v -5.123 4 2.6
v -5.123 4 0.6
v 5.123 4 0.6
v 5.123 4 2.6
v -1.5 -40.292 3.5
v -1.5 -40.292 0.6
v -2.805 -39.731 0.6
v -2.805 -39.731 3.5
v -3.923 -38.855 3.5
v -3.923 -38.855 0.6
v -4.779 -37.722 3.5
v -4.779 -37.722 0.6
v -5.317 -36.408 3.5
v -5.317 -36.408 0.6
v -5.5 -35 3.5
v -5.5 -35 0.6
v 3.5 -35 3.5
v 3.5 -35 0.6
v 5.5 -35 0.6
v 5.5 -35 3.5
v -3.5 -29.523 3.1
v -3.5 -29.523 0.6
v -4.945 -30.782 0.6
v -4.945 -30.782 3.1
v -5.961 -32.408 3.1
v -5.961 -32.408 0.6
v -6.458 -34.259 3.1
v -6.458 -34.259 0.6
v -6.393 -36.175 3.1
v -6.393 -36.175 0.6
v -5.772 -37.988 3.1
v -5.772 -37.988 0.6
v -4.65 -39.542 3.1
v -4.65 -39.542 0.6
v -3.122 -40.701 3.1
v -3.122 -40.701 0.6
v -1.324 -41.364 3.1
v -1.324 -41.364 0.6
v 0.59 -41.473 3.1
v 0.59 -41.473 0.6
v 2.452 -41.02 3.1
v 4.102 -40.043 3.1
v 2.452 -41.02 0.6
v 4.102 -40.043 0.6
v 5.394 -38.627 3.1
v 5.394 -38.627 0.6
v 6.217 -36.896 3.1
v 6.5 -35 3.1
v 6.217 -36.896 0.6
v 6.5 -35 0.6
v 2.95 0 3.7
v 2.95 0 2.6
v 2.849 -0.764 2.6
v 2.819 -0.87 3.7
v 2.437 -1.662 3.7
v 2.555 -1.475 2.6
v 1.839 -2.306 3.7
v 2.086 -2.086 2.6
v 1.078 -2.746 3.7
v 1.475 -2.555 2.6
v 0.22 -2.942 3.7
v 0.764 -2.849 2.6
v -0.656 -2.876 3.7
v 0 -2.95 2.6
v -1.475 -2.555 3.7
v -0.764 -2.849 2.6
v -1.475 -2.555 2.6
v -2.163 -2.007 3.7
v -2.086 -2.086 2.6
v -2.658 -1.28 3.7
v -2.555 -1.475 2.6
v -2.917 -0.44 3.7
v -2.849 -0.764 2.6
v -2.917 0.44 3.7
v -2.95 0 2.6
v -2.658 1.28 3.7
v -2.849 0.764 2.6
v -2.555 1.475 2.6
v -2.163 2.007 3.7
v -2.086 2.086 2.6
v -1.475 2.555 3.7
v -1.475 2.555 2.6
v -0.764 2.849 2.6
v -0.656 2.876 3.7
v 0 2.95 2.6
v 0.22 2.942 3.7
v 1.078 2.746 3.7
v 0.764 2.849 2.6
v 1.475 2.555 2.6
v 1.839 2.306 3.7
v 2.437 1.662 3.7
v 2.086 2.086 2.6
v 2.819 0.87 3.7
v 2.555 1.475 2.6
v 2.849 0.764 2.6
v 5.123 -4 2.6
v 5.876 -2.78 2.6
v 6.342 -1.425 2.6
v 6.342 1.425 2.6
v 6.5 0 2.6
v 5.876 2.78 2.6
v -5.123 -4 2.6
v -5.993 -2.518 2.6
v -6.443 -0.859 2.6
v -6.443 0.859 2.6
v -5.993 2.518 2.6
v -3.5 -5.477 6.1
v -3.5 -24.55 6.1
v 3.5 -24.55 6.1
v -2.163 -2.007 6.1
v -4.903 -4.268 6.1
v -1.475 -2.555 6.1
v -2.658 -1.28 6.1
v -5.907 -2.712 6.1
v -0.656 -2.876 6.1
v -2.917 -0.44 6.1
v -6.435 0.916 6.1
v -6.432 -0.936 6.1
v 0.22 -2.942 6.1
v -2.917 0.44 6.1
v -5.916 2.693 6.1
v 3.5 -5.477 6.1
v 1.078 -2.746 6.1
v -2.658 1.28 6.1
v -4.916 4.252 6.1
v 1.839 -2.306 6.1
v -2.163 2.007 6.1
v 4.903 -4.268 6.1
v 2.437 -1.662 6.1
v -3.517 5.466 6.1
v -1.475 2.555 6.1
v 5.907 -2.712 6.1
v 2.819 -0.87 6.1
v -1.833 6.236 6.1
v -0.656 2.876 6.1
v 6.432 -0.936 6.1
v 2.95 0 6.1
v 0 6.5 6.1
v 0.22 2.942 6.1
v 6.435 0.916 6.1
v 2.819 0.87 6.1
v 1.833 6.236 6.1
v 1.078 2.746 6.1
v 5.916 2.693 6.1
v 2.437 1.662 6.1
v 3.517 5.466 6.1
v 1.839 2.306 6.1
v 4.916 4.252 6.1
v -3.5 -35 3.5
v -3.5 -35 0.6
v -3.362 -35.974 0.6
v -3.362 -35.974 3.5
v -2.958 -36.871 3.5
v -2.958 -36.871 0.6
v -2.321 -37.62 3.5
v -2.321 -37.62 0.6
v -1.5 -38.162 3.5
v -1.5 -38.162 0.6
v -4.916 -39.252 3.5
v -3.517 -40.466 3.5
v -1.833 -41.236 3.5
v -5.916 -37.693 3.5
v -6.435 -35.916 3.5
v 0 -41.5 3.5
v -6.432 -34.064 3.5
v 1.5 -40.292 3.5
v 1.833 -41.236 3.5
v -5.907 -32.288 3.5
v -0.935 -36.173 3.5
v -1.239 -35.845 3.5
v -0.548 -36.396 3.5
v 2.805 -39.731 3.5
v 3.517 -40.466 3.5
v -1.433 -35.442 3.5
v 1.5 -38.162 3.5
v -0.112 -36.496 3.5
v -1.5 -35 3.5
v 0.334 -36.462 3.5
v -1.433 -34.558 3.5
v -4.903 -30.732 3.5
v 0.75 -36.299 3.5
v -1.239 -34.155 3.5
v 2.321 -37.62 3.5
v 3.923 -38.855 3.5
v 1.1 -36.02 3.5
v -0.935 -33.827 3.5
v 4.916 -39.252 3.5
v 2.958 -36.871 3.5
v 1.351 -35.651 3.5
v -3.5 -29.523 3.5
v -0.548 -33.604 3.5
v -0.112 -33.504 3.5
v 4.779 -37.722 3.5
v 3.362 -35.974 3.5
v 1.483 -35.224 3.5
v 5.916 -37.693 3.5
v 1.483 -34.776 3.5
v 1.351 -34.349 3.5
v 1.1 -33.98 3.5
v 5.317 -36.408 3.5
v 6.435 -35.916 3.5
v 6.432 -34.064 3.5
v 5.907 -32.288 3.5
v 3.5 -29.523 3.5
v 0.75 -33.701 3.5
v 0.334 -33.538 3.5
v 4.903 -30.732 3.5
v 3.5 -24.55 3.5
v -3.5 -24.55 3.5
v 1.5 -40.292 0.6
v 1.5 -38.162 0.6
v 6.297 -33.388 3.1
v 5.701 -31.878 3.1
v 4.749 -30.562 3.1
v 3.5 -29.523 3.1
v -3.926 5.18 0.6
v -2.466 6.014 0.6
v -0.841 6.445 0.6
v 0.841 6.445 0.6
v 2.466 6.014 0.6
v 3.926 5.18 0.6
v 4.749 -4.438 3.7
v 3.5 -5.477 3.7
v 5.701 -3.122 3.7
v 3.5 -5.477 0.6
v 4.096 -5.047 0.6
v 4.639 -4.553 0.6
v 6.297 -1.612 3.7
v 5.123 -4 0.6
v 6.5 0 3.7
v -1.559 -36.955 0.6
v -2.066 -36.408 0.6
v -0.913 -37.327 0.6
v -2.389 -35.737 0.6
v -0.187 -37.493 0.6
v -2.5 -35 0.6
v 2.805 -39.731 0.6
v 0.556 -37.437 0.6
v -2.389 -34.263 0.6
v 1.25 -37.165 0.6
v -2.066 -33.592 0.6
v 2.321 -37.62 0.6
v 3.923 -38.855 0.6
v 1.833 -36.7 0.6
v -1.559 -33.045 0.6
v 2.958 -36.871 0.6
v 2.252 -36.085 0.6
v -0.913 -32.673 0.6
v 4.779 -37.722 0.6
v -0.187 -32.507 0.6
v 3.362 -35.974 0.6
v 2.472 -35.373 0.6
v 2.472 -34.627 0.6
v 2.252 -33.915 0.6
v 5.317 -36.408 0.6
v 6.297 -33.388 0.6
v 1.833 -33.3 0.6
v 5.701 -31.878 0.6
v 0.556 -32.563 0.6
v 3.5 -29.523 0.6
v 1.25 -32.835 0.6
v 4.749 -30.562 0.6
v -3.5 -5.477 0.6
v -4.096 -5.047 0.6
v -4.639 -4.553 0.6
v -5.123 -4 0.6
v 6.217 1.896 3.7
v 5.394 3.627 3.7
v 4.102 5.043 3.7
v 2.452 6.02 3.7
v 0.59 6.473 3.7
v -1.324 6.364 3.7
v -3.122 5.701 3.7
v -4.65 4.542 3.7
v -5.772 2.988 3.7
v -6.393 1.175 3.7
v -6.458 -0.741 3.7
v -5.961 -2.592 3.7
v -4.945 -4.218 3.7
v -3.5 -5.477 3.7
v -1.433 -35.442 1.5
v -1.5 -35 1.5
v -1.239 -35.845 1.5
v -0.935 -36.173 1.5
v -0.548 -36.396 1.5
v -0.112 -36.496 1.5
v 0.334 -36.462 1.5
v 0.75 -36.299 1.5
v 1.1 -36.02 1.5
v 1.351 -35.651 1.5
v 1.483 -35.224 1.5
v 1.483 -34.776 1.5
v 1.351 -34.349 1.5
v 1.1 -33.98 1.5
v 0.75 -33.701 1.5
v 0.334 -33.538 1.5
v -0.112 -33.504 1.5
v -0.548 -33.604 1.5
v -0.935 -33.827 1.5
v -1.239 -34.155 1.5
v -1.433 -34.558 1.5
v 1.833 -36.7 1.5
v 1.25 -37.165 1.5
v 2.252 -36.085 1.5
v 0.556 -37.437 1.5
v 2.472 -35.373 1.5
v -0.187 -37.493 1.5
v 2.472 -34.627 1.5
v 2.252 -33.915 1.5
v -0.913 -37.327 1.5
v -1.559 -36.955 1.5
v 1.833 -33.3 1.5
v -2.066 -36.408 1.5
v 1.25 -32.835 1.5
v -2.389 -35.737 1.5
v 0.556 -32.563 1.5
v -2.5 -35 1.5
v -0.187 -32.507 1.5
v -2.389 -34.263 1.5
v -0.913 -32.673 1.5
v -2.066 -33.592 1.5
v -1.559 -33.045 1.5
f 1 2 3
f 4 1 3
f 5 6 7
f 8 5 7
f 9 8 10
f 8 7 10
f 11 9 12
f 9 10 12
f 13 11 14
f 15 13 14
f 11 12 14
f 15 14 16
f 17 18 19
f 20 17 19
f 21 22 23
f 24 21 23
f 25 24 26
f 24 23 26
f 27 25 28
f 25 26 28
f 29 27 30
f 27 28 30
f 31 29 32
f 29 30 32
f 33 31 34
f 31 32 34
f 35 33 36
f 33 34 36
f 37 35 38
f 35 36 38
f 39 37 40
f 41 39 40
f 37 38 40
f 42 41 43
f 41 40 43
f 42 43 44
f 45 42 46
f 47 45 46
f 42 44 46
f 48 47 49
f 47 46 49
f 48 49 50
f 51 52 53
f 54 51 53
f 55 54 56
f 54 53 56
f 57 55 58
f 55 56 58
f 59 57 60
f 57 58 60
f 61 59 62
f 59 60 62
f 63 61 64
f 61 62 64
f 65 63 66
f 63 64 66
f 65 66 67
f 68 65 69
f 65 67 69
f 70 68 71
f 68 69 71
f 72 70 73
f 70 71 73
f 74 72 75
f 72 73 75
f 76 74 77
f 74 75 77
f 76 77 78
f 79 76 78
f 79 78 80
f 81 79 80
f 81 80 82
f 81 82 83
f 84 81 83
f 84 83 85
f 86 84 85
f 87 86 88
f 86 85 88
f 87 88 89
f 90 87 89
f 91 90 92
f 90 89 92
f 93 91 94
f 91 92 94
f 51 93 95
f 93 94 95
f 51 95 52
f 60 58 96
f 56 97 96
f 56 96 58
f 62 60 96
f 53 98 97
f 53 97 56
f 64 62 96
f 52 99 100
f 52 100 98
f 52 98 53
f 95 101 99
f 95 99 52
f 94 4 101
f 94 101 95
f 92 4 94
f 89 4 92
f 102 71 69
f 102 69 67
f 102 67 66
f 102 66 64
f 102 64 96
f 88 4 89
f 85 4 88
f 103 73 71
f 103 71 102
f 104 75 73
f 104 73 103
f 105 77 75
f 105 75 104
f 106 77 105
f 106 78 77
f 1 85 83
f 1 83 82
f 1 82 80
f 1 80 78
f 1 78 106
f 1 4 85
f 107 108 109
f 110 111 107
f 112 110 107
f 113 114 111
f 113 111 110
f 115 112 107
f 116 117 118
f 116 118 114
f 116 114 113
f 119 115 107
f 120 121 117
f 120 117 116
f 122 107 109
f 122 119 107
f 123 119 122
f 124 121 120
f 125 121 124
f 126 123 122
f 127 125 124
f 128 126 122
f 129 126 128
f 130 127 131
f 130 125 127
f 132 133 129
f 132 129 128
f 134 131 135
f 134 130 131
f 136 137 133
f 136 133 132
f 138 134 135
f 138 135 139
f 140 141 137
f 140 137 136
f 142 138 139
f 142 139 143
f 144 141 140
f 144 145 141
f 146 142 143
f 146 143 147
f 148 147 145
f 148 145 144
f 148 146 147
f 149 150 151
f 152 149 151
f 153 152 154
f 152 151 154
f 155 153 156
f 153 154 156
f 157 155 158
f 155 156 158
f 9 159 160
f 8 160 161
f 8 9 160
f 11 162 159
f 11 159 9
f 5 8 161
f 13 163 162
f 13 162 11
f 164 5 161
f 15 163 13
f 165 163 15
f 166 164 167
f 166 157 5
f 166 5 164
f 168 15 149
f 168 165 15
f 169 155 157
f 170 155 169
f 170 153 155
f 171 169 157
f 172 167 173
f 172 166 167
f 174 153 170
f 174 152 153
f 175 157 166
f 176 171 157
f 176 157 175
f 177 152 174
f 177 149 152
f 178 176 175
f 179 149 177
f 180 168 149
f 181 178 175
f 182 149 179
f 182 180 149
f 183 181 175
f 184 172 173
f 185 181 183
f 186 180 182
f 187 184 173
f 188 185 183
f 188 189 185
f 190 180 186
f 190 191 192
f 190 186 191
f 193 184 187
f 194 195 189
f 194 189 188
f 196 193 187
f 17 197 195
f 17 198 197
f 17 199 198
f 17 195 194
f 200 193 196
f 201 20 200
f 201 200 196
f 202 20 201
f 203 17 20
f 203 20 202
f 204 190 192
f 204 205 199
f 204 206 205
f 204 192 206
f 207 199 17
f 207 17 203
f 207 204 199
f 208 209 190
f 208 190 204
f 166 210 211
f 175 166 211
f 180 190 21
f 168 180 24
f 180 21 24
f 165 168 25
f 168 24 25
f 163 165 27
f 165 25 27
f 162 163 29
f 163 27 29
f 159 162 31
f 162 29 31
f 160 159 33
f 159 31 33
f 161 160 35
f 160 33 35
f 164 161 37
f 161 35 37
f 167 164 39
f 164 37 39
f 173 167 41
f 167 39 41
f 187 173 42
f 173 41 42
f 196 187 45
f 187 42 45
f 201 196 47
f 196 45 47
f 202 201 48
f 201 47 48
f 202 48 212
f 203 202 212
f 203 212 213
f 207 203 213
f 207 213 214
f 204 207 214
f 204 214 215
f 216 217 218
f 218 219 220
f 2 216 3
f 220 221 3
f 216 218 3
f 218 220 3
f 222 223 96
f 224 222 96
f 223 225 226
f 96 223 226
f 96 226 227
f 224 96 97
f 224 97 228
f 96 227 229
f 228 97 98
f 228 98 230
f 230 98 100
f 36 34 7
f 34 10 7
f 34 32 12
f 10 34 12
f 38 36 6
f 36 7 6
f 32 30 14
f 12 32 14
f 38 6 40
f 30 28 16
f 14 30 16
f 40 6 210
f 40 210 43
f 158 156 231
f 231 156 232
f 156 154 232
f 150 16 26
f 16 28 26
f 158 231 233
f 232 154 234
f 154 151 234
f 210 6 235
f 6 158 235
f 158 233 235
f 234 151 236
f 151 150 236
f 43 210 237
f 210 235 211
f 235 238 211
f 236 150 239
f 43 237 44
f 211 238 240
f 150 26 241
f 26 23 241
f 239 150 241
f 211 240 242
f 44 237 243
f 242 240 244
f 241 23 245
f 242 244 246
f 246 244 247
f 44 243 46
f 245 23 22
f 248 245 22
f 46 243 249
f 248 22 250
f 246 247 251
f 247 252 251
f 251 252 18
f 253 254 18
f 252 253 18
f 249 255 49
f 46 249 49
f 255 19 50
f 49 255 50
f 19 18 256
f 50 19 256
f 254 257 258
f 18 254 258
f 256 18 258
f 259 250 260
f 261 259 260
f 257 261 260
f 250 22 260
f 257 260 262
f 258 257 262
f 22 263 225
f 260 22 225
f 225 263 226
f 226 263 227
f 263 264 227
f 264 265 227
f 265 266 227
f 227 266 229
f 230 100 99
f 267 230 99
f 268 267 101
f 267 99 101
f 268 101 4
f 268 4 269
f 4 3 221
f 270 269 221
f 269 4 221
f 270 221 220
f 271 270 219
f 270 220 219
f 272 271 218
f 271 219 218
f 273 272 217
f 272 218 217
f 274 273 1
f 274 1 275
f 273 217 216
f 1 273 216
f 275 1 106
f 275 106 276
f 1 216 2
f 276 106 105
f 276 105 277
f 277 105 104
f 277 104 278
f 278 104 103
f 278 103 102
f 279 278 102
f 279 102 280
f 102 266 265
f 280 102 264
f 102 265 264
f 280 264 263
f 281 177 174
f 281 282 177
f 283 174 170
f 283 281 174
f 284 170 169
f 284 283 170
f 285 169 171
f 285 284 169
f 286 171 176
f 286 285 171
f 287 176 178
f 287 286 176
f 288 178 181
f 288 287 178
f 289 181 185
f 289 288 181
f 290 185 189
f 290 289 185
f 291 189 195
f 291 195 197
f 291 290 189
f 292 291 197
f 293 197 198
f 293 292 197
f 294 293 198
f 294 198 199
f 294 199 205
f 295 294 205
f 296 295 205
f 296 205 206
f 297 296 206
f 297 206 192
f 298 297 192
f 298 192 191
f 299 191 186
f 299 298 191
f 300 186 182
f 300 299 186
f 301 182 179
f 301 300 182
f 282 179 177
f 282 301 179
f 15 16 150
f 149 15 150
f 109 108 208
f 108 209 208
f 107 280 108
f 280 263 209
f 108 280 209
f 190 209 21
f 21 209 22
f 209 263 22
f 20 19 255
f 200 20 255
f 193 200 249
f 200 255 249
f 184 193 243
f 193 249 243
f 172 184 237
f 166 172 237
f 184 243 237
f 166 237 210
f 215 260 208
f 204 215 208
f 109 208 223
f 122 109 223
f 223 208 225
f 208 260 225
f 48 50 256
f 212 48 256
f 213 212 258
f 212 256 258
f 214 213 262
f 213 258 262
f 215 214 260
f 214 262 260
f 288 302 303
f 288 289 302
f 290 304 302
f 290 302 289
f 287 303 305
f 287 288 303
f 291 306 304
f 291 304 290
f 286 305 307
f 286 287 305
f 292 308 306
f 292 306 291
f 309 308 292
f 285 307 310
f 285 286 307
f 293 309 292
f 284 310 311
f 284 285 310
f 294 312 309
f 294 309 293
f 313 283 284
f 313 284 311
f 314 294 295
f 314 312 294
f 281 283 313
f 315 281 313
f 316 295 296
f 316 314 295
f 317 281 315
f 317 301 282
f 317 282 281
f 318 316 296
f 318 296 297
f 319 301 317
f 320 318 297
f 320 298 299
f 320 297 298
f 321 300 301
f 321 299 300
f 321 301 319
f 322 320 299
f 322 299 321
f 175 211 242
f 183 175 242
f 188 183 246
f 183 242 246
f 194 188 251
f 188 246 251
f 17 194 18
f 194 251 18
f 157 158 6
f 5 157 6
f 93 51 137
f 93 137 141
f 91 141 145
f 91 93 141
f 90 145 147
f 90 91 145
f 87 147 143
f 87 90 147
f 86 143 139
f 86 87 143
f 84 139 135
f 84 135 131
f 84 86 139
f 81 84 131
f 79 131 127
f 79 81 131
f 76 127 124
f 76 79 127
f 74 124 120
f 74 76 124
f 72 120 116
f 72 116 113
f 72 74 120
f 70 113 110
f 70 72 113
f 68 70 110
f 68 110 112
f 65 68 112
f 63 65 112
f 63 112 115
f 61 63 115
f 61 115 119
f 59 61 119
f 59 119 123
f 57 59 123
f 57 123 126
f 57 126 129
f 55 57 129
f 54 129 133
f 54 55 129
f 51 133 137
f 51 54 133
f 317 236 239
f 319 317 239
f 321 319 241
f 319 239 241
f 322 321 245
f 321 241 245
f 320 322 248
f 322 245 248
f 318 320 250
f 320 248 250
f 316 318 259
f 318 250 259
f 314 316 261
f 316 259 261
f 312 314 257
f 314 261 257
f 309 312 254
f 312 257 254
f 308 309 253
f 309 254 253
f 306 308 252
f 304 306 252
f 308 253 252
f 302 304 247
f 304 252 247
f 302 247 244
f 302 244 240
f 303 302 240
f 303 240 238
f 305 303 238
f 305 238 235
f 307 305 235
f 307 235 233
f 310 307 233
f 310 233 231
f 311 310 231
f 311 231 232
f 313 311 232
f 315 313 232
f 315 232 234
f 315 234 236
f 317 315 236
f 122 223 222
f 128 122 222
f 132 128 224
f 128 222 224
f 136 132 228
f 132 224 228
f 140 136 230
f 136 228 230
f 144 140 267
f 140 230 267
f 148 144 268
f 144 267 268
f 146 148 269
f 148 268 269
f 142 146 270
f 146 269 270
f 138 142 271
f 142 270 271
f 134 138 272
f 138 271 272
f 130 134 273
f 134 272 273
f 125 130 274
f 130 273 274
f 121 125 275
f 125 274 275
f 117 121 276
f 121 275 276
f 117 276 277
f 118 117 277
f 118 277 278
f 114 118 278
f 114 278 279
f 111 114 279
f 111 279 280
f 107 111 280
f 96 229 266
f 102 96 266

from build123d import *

# Parameters (mm, degrees)
BOSS_EXTRUDE1_DEPTH     = 3.7
SKETCH2_W               = 0.6
SKETCH2_H               = 16.95
CUT_EXTRUDE1_DEPTH      = 10
CUT_EXTRUDE1_DEPTH_BACK = 10
SKETCH3_R               = 2.95
SKETCH3_R_2             = 1.5
BOSS_EXTRUDE2_DEPTH     = 3.1
SKETCH4_R               = 2.5
CUT_EXTRUDE2_DEPTH      = 1.5
SKETCH5_R               = 1.5
BOSS_EXTRUDE3_DEPTH     = 0.4
SKETCH6_R               = 2.95
BOSS_EXTRUDE4_DEPTH     = 2.4
SKETCH7_W               = 22.104564564
SKETCH7_H               = 50.546801486
CUT_EXTRUDE3_DEPTH      = 0.6
SKETCH8_R               = 5.5
SKETCH8_R_2             = 3.5
BOSS_EXTRUDE5_DEPTH     = 5.5
CUT_EXTRUDE4_DEPTH      = 2


with BuildPart() as part:
    # Sketch1 → Boss-Extrude1 (new body)
    with BuildSketch(Plane.XY):
        with BuildLine():
            ThreePointArc((3.5, -5.477225575), (0, -6.5), (-3.5, -5.477225575))
            Line((-3.5, -5.477225575), (-3.5, -29.522774425))
            ThreePointArc((-3.5, -29.522774425), (0, -28.5), (3.5, -29.522774425))
            Line((3.5, -29.522774425), (3.5, -5.477225575))
        make_face()
        with BuildLine():
            ThreePointArc((-3.5, -4.242640687), (-4.974937186, -2.34520788), (-5.5, 0))
            ThreePointArc((-5.5, 0), (-4.387482194, 3.31662479), (-1.5, 5.291502622))
            ThreePointArc((-1.5, 5.291502622), (0, 5.5), (1.5, 5.291502622))
            ThreePointArc((1.5, 5.291502622), (4.387482194, 3.31662479), (5.5, 0))
            ThreePointArc((5.5, 0), (4.974937186, -2.34520788), (3.5, -4.242640687))
            Line((3.5, -4.242640687), (3.5, -5.477225575))
            ThreePointArc((3.5, -5.477225575), (5.700877125, -3.122498999), (6.5, 0))
            ThreePointArc((6.5, 0), (-3.122498999, 5.700877125), (-3.5, -5.477225575))
            Line((-3.5, -5.477225575), (-3.5, -4.242640687))
        make_face()
        with BuildLine():
            ThreePointArc((3.5, -4.242640687), (0, -5.5), (-3.5, -4.242640687))
            Line((-3.5, -4.242640687), (-3.5, -5.477225575))
            ThreePointArc((-3.5, -5.477225575), (0, -6.5), (3.5, -5.477225575))
            Line((3.5, -5.477225575), (3.5, -4.242640687))
        make_face()
        with BuildLine():
            ThreePointArc((3.5, 0), (0, -3.5), (-3.5, 0))
            Line((-3.5, 0), (-3.5, -4.242640687))
            ThreePointArc((-3.5, -4.242640687), (0, -5.5), (3.5, -4.242640687))
            Line((3.5, -4.242640687), (3.5, 0))
        make_face()
        with BuildLine():
            ThreePointArc((3.5, -29.522774425), (0, -28.5), (-3.5, -29.522774425))
            Line((-3.5, -29.522774425), (-3.5, -30.757359313))
            ThreePointArc((-3.5, -30.757359313), (0, -29.5), (3.5, -30.757359313))
            Line((3.5, -30.757359313), (3.5, -29.522774425))
        make_face()
        with BuildLine():
            Line((-3.5, -30.757359313), (-3.5, -29.522774425))
            ThreePointArc((-3.5, -29.522774425), (-3.122498999, -40.700877125), (6.5, -35))
            ThreePointArc((6.5, -35), (5.700877125, -31.877501001), (3.5, -29.522774425))
            Line((3.5, -29.522774425), (3.5, -30.757359313))
            ThreePointArc((3.5, -30.757359313), (4.974937186, -32.65479212), (5.5, -35))
            ThreePointArc((5.5, -35), (4.387482194, -38.31662479), (1.5, -40.291502622))
            ThreePointArc((1.5, -40.291502622), (0, -40.5), (-1.5, -40.291502622))
            ThreePointArc((-1.5, -40.291502622), (-4.387482194, -38.31662479), (-5.5, -35))
            ThreePointArc((-5.5, -35), (-4.974937186, -32.65479212), (-3.5, -30.757359313))
        make_face()
        with BuildLine():
            ThreePointArc((3.5, -30.757359313), (0, -29.5), (-3.5, -30.757359313))
            Line((-3.5, -30.757359313), (-3.5, -35))
            ThreePointArc((-3.5, -35), (0, -31.5), (3.5, -35))
            Line((3.5, -35), (3.5, -30.757359313))
        make_face()
        with BuildLine():
            Line((-3.5, -35), (-3.5, -30.757359313))
            ThreePointArc((-3.5, -30.757359313), (-4.974937186, -32.65479212), (-5.5, -35))
            Line((-5.5, -35), (-3.5, -35))
        make_face()
        with BuildLine():
            ThreePointArc((5.5, -35), (4.974937186, -32.65479212), (3.5, -30.757359313))
            Line((3.5, -30.757359313), (3.5, -35))
            Line((3.5, -35), (5.5, -35))
        make_face()
        with BuildLine():
            ThreePointArc((3.5, -35), (0, -31.5), (-3.5, -35))
            Line((-3.5, -35), (-2.95, -35))
            ThreePointArc((-2.95, -35), (0, -32.05), (2.95, -35))
            Line((2.95, -35), (3.5, -35))
        make_face()
        with BuildLine():
            Line((-2.95, -35), (-3.5, -35))
            ThreePointArc((-3.5, -35), (-2.958039892, -36.870828693), (-1.5, -38.16227766))
            ThreePointArc((-1.5, -38.16227766), (0, -38.5), (1.5, -38.16227766))
            ThreePointArc((1.5, -38.16227766), (2.958039892, -36.870828693), (3.5, -35))
            Line((3.5, -35), (2.95, -35))
            ThreePointArc((2.95, -35), (0, -37.95), (-2.95, -35))
        make_face()
        with BuildLine():
            Line((-1.5, 5.291502622), (-1.5, 3.16227766))
            ThreePointArc((-1.5, 3.16227766), (0, 3.5), (1.5, 3.16227766))
            Line((1.5, 3.16227766), (1.5, 5.291502622))
            ThreePointArc((1.5, 5.291502622), (0, 5.5), (-1.5, 5.291502622))
        make_face()
        with BuildLine():
            Line((-3.5, -4.242640687), (-3.5, 0))
            Line((-3.5, 0), (-5.5, 0))
            ThreePointArc((-5.5, 0), (-4.974937186, -2.34520788), (-3.5, -4.242640687))
        make_face()
        with BuildLine():
            Line((5.5, 0), (3.5, 0))
            Line((3.5, 0), (3.5, -4.242640687))
            ThreePointArc((3.5, -4.242640687), (4.974937186, -2.34520788), (5.5, 0))
        make_face()
        with BuildLine():
            ThreePointArc((-1.5, 3.16227766), (-2.958039892, 1.870828693), (-3.5, 0))
            Line((-3.5, 0), (-2.95, 0))
            ThreePointArc((-2.95, 0), (0, 2.95), (2.95, 0))
            Line((2.95, 0), (3.5, 0))
            ThreePointArc((3.5, 0), (2.958039892, 1.870828693), (1.5, 3.16227766))
            ThreePointArc((1.5, 3.16227766), (0, 3.5), (-1.5, 3.16227766))
        make_face()
        with BuildLine():
            Line((-2.95, 0), (-3.5, 0))
            ThreePointArc((-3.5, 0), (0, -3.5), (3.5, 0))
            Line((3.5, 0), (2.95, 0))
            ThreePointArc((2.95, 0), (0, -2.95), (-2.95, 0))
        make_face()
        with BuildLine():
            ThreePointArc((1.5, -38.16227766), (0, -38.5), (-1.5, -38.16227766))
            Line((-1.5, -38.16227766), (-1.5, -40.291502622))
            ThreePointArc((-1.5, -40.291502622), (0, -40.5), (1.5, -40.291502622))
            Line((1.5, -40.291502622), (1.5, -38.16227766))
        make_face()
    extrude(amount=BOSS_EXTRUDE1_DEPTH)

    # Sketch2 → Cut-Extrude1 (cut, two sides)
    with BuildSketch(Plane(origin=(0, 0, 0), x_dir=(0, 0, -1), z_dir=(1, 0, 0))) as cut_extrude1_sk:
        with Locations((-3.4, -33.025)):
            Rectangle(SKETCH2_W, SKETCH2_H)
    extrude(amount=CUT_EXTRUDE1_DEPTH, mode=Mode.SUBTRACT)
    extrude(cut_extrude1_sk.sketch, amount=-CUT_EXTRUDE1_DEPTH_BACK, mode=Mode.SUBTRACT)

    # Sketch3 → Boss-Extrude2 (add)
    with BuildSketch(Plane(origin=(0, 0, 0), x_dir=(-1, 0, 0), z_dir=(0, 0, -1))):
        with Locations((0, -35)):
            Circle(SKETCH3_R)
        with Locations((0, -35)):
            Circle(SKETCH3_R_2, mode=Mode.SUBTRACT)
    extrude(amount=-BOSS_EXTRUDE2_DEPTH)

    # Sketch4 → Cut-Extrude2 (cut)
    with BuildSketch(Plane(origin=(0, 0, 0), x_dir=(-1, 0, 0), z_dir=(0, 0, -1))):
        with Locations((0, -35)):
            Circle(SKETCH4_R)
    extrude(amount=-CUT_EXTRUDE2_DEPTH, mode=Mode.SUBTRACT)

    # Sketch5 → Boss-Extrude3 (add)
    with BuildSketch(Plane.XY.offset(3.1)):
        with BuildLine():
            Line((3.5, -24.55), (-3.5, -24.55))
            Line((-3.5, -24.55), (-3.5, -29.522774425))
            ThreePointArc((-3.5, -29.522774425), (0, -41.5), (3.5, -29.522774425))
            Line((3.5, -29.522774425), (3.5, -24.55))
        make_face()
        with BuildLine():
            Line((-5.5, -35), (-3.5, -35))
            ThreePointArc((-3.5, -35), (-2.958039892, -36.870828693), (-1.5, -38.16227766))
            Line((-1.5, -38.16227766), (-1.5, -40.291502622))
            ThreePointArc((-1.5, -40.291502622), (-4.387482194, -38.31662479), (-5.5, -35))
        make_face(mode=Mode.SUBTRACT)
        with BuildLine():
            ThreePointArc((1.5, -38.16227766), (2.958039892, -36.870828693), (3.5, -35))
            Line((3.5, -35), (5.5, -35))
            ThreePointArc((5.5, -35), (4.387482194, -38.31662479), (1.5, -40.291502622))
            Line((1.5, -40.291502622), (1.5, -38.16227766))
        make_face(mode=Mode.SUBTRACT)
        with Locations(Location((0, -35, 0), (0, 0, 180))):
            Circle(SKETCH5_R, mode=Mode.SUBTRACT)
    extrude(amount=BOSS_EXTRUDE3_DEPTH)

    # Sketch6 → Boss-Extrude4 (add)
    with BuildSketch(Plane.XY.offset(3.7)):
        with BuildLine():
            Line((-3.5, -5.477225575), (-3.5, -24.55))
            Line((-3.5, -24.55), (3.5, -24.55))
            Line((3.5, -24.55), (3.5, -5.477225575))
            ThreePointArc((3.5, -5.477225575), (0, 6.5), (-3.5, -5.477225575))
        make_face()
        Circle(SKETCH6_R, mode=Mode.SUBTRACT)
        with BuildLine():
            Line((-1.5, 5.291502622), (-1.5, 3.16227766))
            ThreePointArc((-1.5, 3.16227766), (-2.958039892, 1.870828693), (-3.5, 0))
            Line((-3.5, 0), (-5.5, 0))
            ThreePointArc((-5.5, 0), (-4.387482194, 3.31662479), (-1.5, 5.291502622))
        make_face(mode=Mode.SUBTRACT)
        with BuildLine():
            Line((1.5, 5.291502622), (1.5, 3.16227766))
            ThreePointArc((1.5, 3.16227766), (2.958039892, 1.870828693), (3.5, 0))
            Line((3.5, 0), (5.5, 0))
            ThreePointArc((5.5, 0), (4.387482194, 3.31662479), (1.5, 5.291502622))
        make_face(mode=Mode.SUBTRACT)
    extrude(amount=BOSS_EXTRUDE4_DEPTH)

    # Sketch7 → Cut-Extrude3 (cut)
    with BuildSketch(Plane.XY):
        with Locations((0.952758093, -17.453923436)):
            Rectangle(SKETCH7_W, SKETCH7_H)
    extrude(amount=CUT_EXTRUDE3_DEPTH, mode=Mode.SUBTRACT)

    # Sketch8 → Boss-Extrude5 (add)
    with BuildSketch(Plane.XY.offset(6.1)):
        Circle(SKETCH8_R)
        Circle(SKETCH8_R_2, mode=Mode.SUBTRACT)
    extrude(amount=-BOSS_EXTRUDE5_DEPTH)

    # Sketch9 → Cut-Extrude4 (cut)
    with BuildSketch(Plane(origin=(0, 0, 0.6), x_dir=(-1, 0, 0), z_dir=(0, 0, -1))):
        with BuildLine():
            Line((0, 4), (-5.123475383, 4))
            ThreePointArc((-5.123475383, 4), (-6.5, 0), (-5.123475383, -4))
            Line((-5.123475383, -4), (0, -4))
            Line((0, -4), (0, -2.95))
            ThreePointArc((0, -2.95), (-2.95, 0), (0, 2.95))
            Line((0, 2.95), (0, 4))
        make_face()
        with BuildLine():
            Line((5.123475383, 4), (0, 4))
            Line((0, 4), (0, 2.95))
            ThreePointArc((0, 2.95), (2.085965005, 2.085965005), (2.95, 0))
            ThreePointArc((2.95, 0), (2.085965005, -2.085965005), (0, -2.95))
            Line((0, -2.95), (0, -4))
            Line((0, -4), (5.123475383, -4))
            ThreePointArc((5.123475383, -4), (6.5, 0), (5.123475383, 4))
        make_face()
    extrude(amount=-CUT_EXTRUDE4_DEPTH, mode=Mode.SUBTRACT)


solid = part.part
